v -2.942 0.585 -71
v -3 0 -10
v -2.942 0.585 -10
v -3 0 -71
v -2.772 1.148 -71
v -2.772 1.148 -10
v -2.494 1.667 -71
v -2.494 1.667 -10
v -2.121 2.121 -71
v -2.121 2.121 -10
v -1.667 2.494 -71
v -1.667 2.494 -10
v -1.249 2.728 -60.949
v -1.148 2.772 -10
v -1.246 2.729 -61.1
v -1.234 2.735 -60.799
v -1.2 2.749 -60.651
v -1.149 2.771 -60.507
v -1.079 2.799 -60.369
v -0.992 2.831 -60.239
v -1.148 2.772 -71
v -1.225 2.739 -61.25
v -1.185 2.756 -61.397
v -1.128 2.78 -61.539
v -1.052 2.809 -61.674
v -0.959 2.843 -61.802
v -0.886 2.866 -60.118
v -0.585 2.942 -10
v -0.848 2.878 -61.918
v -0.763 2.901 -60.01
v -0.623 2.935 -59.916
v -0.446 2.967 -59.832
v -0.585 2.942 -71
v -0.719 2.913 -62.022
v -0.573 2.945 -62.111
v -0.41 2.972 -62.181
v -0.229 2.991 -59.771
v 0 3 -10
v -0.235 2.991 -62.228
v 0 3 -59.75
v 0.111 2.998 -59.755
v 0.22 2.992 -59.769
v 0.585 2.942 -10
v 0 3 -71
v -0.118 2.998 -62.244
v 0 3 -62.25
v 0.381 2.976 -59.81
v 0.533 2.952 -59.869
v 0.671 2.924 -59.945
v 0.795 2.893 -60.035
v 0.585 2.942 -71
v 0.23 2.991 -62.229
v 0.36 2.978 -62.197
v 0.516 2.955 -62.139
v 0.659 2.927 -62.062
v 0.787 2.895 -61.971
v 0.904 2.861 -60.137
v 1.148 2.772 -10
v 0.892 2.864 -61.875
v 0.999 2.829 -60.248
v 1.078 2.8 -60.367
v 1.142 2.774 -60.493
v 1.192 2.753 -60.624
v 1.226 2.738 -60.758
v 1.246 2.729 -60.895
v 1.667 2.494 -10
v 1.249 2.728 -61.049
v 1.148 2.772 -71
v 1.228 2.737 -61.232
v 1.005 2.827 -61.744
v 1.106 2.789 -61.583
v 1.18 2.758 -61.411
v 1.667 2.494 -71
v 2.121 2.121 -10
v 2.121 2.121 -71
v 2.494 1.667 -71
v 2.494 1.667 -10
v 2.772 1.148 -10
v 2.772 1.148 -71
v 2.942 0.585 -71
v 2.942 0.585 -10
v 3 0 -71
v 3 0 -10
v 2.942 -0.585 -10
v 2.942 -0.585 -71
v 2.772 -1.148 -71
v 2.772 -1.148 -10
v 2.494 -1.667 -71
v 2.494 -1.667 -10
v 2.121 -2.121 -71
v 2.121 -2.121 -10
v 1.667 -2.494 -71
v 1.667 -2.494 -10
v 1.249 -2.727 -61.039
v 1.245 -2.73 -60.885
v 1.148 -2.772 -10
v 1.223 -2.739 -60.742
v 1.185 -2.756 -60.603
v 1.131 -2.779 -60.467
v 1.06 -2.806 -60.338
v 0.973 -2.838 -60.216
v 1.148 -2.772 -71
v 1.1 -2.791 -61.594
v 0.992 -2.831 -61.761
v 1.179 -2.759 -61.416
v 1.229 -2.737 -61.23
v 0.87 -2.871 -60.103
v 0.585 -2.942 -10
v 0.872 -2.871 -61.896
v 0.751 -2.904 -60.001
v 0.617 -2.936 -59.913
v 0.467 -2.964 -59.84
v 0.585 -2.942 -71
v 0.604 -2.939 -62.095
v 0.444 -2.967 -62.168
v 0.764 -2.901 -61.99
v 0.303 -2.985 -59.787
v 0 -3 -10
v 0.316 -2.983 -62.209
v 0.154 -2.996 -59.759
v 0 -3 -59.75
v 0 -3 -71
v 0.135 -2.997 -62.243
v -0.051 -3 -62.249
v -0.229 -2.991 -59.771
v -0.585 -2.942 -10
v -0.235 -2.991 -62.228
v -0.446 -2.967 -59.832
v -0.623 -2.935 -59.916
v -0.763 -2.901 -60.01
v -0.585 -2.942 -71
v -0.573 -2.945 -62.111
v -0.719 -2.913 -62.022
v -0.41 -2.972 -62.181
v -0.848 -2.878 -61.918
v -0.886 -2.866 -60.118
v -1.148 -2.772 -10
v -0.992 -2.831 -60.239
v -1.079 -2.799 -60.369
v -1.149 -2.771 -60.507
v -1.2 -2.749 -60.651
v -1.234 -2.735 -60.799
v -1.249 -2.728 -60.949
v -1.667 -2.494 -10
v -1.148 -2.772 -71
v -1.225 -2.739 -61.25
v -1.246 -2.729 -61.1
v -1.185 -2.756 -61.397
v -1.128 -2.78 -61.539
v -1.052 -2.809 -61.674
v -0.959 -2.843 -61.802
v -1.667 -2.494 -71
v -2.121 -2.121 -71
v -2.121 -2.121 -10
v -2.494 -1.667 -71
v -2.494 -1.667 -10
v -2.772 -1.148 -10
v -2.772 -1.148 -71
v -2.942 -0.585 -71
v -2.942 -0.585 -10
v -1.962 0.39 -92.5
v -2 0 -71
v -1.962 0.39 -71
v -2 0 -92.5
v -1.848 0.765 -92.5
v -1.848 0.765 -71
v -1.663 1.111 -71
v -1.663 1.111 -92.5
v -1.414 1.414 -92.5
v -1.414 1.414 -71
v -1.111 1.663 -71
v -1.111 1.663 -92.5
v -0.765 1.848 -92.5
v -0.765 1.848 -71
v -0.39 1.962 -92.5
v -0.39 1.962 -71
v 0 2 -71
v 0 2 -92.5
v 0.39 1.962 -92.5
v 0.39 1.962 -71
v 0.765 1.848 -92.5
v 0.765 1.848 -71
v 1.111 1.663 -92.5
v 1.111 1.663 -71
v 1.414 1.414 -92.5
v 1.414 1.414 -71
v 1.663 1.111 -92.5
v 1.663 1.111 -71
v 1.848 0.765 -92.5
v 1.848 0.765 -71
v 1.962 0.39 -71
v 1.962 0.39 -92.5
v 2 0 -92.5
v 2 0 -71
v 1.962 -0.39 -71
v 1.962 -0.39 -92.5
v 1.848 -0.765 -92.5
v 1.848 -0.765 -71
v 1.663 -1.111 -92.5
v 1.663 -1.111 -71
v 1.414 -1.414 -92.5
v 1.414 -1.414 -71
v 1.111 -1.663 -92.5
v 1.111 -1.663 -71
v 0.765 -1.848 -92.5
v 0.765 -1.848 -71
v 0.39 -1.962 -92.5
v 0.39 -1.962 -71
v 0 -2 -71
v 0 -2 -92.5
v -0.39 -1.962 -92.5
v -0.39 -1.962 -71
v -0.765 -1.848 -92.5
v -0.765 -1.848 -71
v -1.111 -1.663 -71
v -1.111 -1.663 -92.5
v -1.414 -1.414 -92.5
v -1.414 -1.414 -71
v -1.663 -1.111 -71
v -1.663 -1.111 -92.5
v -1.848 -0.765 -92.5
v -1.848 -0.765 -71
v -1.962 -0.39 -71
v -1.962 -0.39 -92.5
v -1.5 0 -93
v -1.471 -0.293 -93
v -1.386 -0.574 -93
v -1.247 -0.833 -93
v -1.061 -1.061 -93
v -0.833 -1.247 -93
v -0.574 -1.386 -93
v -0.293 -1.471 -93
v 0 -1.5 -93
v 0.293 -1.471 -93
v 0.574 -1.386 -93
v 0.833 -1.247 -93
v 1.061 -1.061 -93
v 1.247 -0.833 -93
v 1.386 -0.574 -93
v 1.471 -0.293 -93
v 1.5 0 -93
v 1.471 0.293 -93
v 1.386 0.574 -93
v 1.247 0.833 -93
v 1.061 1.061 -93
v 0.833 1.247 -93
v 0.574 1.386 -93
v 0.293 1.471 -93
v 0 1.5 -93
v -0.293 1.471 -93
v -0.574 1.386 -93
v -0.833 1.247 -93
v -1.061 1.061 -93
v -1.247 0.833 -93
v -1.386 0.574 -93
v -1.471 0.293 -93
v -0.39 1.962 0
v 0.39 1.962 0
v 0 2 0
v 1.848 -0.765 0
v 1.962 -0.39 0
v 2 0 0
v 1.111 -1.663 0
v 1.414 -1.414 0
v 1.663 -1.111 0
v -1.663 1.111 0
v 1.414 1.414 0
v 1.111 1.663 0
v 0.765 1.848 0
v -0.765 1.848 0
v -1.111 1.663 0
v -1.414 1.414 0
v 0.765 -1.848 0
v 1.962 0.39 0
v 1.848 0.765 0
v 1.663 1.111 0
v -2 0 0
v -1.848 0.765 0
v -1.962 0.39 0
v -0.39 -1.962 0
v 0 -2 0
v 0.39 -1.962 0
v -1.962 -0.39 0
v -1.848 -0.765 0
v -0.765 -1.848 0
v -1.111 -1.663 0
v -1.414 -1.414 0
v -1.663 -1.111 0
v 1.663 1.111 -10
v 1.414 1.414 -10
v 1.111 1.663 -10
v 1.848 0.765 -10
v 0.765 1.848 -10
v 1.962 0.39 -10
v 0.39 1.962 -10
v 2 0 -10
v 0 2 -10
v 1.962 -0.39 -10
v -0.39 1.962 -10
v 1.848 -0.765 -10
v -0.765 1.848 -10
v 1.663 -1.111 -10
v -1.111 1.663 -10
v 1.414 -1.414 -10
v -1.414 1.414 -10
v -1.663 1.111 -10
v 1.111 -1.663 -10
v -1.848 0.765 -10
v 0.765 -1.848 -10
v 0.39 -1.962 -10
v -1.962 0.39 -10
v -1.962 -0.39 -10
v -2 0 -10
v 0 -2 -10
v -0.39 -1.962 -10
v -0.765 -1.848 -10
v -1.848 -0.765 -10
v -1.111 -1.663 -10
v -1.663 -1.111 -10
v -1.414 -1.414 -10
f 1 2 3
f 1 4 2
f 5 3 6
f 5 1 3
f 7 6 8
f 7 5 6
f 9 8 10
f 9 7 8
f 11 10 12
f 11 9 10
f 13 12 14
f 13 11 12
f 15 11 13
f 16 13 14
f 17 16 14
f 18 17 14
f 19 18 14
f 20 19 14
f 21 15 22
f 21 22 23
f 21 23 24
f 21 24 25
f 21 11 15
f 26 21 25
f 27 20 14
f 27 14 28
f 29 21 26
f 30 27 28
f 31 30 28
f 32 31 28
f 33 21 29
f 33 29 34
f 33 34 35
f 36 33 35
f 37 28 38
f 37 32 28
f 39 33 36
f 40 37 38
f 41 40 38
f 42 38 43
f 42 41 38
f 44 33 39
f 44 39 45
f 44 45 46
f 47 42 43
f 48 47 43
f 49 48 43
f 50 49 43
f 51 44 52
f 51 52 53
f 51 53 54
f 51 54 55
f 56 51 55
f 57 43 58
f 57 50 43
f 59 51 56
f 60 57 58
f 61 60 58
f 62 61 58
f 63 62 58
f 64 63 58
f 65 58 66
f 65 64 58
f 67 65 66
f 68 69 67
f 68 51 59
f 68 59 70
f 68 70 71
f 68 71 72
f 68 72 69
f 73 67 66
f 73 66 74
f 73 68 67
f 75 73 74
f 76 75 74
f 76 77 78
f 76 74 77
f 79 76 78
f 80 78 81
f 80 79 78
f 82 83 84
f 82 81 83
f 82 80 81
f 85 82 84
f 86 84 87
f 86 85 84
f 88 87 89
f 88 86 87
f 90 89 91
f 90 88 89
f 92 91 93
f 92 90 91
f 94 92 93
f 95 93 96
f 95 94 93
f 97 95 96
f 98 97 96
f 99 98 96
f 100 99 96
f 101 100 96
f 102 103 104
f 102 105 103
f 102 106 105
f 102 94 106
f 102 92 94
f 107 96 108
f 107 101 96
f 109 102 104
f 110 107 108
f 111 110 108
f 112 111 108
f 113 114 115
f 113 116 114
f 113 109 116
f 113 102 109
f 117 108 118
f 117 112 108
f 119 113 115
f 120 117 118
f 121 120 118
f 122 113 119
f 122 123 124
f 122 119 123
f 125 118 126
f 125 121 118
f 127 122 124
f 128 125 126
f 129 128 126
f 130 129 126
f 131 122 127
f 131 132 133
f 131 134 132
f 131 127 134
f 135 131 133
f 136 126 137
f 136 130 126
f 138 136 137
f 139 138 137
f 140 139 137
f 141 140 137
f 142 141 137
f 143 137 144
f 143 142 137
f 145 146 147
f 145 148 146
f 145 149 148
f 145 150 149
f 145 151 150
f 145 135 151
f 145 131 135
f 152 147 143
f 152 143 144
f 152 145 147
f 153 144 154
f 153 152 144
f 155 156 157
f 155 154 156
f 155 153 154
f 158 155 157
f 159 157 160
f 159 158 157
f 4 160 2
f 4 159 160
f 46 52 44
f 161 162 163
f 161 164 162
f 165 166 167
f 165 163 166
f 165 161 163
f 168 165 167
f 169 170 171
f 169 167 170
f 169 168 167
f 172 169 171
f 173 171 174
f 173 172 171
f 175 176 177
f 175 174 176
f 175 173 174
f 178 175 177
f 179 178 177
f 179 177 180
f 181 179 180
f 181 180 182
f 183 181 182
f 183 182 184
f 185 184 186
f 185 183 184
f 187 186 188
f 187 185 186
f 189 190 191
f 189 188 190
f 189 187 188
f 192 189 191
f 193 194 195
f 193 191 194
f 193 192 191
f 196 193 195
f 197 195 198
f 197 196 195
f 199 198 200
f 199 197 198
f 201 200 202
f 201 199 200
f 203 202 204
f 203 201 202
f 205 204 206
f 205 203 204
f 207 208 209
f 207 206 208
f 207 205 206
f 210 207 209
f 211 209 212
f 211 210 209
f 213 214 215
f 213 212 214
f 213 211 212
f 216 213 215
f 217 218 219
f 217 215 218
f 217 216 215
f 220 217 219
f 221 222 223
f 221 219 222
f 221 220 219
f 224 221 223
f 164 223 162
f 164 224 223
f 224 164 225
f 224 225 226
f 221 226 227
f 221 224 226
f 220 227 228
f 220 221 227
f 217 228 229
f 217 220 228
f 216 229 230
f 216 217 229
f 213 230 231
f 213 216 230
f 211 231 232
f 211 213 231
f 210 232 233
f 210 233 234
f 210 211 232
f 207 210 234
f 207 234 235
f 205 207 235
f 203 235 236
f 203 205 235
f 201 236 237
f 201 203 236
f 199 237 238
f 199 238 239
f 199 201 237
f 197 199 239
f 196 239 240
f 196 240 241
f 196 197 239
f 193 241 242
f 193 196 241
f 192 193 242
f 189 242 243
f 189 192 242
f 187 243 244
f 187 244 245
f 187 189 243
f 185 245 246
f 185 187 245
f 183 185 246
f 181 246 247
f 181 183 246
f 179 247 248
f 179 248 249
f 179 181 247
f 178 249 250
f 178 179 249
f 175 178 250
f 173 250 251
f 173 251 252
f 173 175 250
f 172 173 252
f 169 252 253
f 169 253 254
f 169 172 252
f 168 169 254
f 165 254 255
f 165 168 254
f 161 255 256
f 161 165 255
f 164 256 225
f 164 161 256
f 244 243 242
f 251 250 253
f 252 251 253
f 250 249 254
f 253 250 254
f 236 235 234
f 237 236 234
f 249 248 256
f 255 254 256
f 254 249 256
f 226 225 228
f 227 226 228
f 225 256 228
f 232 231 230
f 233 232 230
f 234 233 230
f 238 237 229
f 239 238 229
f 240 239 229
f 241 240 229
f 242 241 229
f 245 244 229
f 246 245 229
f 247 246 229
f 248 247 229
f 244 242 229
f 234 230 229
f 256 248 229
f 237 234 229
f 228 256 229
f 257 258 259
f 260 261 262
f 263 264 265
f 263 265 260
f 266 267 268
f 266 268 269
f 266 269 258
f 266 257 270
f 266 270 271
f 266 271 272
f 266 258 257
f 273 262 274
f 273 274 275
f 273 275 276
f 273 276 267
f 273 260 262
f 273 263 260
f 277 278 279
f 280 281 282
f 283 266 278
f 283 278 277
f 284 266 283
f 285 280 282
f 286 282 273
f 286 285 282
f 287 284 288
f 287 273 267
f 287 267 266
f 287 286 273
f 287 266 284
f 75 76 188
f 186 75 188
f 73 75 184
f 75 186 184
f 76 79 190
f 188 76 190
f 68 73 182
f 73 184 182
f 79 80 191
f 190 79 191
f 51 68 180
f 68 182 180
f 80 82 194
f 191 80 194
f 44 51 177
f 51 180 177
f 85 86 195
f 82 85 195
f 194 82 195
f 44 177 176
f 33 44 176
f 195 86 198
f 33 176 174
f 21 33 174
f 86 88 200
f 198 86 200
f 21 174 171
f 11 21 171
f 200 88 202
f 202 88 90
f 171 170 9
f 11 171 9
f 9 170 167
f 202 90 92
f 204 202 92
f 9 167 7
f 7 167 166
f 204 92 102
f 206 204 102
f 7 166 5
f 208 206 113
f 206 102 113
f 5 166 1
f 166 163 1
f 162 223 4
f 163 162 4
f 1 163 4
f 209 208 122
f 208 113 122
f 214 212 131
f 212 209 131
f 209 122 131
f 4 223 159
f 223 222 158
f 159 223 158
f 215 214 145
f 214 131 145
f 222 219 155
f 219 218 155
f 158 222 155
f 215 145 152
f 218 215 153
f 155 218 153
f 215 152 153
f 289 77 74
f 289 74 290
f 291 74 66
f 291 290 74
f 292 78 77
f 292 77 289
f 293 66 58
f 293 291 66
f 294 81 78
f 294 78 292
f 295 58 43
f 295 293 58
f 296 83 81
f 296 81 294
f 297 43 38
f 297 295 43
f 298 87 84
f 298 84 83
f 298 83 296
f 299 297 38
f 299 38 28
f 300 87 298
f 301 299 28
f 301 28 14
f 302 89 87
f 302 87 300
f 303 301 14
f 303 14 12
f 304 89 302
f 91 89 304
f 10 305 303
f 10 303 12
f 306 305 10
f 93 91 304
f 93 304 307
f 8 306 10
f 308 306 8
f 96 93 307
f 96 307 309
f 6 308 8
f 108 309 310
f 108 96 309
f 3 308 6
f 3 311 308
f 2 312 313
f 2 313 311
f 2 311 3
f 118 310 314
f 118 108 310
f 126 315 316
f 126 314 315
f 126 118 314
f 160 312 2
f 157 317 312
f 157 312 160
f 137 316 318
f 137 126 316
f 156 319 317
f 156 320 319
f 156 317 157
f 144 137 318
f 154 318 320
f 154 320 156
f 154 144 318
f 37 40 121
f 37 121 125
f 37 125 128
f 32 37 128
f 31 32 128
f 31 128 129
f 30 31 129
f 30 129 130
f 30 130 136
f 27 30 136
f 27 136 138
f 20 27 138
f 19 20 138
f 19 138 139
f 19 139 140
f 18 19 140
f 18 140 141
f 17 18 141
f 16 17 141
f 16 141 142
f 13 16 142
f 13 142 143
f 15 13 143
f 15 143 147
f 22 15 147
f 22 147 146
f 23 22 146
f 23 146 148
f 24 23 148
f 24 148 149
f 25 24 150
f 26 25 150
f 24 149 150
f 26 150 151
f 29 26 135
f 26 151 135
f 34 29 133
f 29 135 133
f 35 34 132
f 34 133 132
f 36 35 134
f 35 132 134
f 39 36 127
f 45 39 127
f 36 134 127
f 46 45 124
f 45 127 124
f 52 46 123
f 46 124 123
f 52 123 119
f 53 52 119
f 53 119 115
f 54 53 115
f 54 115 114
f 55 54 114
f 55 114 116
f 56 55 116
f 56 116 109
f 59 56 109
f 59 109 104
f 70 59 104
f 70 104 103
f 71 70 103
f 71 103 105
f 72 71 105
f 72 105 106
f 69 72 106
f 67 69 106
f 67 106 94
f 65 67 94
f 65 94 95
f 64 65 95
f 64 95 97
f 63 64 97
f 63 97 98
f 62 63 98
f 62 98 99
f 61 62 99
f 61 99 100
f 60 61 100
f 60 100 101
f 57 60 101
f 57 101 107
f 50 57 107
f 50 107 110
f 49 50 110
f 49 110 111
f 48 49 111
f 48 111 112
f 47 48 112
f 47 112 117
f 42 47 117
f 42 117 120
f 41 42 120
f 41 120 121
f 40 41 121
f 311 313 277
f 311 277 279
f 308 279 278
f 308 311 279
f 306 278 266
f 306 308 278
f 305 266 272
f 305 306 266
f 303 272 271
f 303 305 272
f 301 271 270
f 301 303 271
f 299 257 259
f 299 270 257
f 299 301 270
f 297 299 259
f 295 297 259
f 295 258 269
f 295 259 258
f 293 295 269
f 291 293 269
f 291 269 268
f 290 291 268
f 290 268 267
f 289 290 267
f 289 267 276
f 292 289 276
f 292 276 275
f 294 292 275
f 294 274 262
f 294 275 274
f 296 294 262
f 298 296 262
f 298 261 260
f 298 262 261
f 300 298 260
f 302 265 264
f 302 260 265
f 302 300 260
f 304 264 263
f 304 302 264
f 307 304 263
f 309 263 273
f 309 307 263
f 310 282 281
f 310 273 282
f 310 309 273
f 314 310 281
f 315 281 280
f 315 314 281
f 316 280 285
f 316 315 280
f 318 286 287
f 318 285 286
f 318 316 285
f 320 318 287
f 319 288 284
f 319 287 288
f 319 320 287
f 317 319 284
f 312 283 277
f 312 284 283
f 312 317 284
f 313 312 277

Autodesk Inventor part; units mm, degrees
ref_plane "YZ Plane" through (0, 0, 0) normal (1, 0, 0) x (0, 1, 0)
ref_plane "XY Plane" through (0, 0, 0) normal (0, 0, 1) x (1, 0, 0)
sketch "Skizze1" plane through (0, 0, 0) normal (0, 1, 0) x (-1, 0, 0)
  line L0 (0, 0) -> (2, 0)
  line L1 (2, 0) -> (2, -10)
  line L2 (2, -10) -> (3, -10)
  line L3 (3, -10) -> (3, -71)
  line L4 (3, -71) -> (2, -71)
  line L5 (2, -71) -> (2, -93)
  line L6 (2, -93) -> (0, -93)
  line L7 (0, -93) -> (0, 0)
  dimension "d0" = 10
  dimension "d1" = 22
  dimension "d2" = 93
  dimension "d3" = 4
  dimension "d4" = 6
revolve "Umdrehung1" add sketch "Skizze1" angle 360 about axis through (0, 0, -93) along (0, 0, 1)
thread "Gewinde1" size "M4x0.7" class "6g" standard "ISO Metric profile" full length
ref_plane "Arbeitsebene1" through (0, 3, 0) normal (0, 1, 0) x (-1, 0, 0)
sketch "Skizze2" plane through (0, 3, 0) normal (0, 1, 0) x (-1, 0, 0)
  line L0 (3, -10) -> (-3, -10) projected
  line L1 (3, -71) -> (-3, -71) projected
  point P0 (0, 0)
  point P1 (0, -61)
  dimension "d9" = 10
hole "Bohrung1" at (0, 3, -61) direction (0, -1, 0) diameter 2.5 end through all
chamfer "Fasen1" distance 0.5 angle 45 1 edges at (2, 0, -93)
properties part number "205 part 1" material "Aluminium 6061"
